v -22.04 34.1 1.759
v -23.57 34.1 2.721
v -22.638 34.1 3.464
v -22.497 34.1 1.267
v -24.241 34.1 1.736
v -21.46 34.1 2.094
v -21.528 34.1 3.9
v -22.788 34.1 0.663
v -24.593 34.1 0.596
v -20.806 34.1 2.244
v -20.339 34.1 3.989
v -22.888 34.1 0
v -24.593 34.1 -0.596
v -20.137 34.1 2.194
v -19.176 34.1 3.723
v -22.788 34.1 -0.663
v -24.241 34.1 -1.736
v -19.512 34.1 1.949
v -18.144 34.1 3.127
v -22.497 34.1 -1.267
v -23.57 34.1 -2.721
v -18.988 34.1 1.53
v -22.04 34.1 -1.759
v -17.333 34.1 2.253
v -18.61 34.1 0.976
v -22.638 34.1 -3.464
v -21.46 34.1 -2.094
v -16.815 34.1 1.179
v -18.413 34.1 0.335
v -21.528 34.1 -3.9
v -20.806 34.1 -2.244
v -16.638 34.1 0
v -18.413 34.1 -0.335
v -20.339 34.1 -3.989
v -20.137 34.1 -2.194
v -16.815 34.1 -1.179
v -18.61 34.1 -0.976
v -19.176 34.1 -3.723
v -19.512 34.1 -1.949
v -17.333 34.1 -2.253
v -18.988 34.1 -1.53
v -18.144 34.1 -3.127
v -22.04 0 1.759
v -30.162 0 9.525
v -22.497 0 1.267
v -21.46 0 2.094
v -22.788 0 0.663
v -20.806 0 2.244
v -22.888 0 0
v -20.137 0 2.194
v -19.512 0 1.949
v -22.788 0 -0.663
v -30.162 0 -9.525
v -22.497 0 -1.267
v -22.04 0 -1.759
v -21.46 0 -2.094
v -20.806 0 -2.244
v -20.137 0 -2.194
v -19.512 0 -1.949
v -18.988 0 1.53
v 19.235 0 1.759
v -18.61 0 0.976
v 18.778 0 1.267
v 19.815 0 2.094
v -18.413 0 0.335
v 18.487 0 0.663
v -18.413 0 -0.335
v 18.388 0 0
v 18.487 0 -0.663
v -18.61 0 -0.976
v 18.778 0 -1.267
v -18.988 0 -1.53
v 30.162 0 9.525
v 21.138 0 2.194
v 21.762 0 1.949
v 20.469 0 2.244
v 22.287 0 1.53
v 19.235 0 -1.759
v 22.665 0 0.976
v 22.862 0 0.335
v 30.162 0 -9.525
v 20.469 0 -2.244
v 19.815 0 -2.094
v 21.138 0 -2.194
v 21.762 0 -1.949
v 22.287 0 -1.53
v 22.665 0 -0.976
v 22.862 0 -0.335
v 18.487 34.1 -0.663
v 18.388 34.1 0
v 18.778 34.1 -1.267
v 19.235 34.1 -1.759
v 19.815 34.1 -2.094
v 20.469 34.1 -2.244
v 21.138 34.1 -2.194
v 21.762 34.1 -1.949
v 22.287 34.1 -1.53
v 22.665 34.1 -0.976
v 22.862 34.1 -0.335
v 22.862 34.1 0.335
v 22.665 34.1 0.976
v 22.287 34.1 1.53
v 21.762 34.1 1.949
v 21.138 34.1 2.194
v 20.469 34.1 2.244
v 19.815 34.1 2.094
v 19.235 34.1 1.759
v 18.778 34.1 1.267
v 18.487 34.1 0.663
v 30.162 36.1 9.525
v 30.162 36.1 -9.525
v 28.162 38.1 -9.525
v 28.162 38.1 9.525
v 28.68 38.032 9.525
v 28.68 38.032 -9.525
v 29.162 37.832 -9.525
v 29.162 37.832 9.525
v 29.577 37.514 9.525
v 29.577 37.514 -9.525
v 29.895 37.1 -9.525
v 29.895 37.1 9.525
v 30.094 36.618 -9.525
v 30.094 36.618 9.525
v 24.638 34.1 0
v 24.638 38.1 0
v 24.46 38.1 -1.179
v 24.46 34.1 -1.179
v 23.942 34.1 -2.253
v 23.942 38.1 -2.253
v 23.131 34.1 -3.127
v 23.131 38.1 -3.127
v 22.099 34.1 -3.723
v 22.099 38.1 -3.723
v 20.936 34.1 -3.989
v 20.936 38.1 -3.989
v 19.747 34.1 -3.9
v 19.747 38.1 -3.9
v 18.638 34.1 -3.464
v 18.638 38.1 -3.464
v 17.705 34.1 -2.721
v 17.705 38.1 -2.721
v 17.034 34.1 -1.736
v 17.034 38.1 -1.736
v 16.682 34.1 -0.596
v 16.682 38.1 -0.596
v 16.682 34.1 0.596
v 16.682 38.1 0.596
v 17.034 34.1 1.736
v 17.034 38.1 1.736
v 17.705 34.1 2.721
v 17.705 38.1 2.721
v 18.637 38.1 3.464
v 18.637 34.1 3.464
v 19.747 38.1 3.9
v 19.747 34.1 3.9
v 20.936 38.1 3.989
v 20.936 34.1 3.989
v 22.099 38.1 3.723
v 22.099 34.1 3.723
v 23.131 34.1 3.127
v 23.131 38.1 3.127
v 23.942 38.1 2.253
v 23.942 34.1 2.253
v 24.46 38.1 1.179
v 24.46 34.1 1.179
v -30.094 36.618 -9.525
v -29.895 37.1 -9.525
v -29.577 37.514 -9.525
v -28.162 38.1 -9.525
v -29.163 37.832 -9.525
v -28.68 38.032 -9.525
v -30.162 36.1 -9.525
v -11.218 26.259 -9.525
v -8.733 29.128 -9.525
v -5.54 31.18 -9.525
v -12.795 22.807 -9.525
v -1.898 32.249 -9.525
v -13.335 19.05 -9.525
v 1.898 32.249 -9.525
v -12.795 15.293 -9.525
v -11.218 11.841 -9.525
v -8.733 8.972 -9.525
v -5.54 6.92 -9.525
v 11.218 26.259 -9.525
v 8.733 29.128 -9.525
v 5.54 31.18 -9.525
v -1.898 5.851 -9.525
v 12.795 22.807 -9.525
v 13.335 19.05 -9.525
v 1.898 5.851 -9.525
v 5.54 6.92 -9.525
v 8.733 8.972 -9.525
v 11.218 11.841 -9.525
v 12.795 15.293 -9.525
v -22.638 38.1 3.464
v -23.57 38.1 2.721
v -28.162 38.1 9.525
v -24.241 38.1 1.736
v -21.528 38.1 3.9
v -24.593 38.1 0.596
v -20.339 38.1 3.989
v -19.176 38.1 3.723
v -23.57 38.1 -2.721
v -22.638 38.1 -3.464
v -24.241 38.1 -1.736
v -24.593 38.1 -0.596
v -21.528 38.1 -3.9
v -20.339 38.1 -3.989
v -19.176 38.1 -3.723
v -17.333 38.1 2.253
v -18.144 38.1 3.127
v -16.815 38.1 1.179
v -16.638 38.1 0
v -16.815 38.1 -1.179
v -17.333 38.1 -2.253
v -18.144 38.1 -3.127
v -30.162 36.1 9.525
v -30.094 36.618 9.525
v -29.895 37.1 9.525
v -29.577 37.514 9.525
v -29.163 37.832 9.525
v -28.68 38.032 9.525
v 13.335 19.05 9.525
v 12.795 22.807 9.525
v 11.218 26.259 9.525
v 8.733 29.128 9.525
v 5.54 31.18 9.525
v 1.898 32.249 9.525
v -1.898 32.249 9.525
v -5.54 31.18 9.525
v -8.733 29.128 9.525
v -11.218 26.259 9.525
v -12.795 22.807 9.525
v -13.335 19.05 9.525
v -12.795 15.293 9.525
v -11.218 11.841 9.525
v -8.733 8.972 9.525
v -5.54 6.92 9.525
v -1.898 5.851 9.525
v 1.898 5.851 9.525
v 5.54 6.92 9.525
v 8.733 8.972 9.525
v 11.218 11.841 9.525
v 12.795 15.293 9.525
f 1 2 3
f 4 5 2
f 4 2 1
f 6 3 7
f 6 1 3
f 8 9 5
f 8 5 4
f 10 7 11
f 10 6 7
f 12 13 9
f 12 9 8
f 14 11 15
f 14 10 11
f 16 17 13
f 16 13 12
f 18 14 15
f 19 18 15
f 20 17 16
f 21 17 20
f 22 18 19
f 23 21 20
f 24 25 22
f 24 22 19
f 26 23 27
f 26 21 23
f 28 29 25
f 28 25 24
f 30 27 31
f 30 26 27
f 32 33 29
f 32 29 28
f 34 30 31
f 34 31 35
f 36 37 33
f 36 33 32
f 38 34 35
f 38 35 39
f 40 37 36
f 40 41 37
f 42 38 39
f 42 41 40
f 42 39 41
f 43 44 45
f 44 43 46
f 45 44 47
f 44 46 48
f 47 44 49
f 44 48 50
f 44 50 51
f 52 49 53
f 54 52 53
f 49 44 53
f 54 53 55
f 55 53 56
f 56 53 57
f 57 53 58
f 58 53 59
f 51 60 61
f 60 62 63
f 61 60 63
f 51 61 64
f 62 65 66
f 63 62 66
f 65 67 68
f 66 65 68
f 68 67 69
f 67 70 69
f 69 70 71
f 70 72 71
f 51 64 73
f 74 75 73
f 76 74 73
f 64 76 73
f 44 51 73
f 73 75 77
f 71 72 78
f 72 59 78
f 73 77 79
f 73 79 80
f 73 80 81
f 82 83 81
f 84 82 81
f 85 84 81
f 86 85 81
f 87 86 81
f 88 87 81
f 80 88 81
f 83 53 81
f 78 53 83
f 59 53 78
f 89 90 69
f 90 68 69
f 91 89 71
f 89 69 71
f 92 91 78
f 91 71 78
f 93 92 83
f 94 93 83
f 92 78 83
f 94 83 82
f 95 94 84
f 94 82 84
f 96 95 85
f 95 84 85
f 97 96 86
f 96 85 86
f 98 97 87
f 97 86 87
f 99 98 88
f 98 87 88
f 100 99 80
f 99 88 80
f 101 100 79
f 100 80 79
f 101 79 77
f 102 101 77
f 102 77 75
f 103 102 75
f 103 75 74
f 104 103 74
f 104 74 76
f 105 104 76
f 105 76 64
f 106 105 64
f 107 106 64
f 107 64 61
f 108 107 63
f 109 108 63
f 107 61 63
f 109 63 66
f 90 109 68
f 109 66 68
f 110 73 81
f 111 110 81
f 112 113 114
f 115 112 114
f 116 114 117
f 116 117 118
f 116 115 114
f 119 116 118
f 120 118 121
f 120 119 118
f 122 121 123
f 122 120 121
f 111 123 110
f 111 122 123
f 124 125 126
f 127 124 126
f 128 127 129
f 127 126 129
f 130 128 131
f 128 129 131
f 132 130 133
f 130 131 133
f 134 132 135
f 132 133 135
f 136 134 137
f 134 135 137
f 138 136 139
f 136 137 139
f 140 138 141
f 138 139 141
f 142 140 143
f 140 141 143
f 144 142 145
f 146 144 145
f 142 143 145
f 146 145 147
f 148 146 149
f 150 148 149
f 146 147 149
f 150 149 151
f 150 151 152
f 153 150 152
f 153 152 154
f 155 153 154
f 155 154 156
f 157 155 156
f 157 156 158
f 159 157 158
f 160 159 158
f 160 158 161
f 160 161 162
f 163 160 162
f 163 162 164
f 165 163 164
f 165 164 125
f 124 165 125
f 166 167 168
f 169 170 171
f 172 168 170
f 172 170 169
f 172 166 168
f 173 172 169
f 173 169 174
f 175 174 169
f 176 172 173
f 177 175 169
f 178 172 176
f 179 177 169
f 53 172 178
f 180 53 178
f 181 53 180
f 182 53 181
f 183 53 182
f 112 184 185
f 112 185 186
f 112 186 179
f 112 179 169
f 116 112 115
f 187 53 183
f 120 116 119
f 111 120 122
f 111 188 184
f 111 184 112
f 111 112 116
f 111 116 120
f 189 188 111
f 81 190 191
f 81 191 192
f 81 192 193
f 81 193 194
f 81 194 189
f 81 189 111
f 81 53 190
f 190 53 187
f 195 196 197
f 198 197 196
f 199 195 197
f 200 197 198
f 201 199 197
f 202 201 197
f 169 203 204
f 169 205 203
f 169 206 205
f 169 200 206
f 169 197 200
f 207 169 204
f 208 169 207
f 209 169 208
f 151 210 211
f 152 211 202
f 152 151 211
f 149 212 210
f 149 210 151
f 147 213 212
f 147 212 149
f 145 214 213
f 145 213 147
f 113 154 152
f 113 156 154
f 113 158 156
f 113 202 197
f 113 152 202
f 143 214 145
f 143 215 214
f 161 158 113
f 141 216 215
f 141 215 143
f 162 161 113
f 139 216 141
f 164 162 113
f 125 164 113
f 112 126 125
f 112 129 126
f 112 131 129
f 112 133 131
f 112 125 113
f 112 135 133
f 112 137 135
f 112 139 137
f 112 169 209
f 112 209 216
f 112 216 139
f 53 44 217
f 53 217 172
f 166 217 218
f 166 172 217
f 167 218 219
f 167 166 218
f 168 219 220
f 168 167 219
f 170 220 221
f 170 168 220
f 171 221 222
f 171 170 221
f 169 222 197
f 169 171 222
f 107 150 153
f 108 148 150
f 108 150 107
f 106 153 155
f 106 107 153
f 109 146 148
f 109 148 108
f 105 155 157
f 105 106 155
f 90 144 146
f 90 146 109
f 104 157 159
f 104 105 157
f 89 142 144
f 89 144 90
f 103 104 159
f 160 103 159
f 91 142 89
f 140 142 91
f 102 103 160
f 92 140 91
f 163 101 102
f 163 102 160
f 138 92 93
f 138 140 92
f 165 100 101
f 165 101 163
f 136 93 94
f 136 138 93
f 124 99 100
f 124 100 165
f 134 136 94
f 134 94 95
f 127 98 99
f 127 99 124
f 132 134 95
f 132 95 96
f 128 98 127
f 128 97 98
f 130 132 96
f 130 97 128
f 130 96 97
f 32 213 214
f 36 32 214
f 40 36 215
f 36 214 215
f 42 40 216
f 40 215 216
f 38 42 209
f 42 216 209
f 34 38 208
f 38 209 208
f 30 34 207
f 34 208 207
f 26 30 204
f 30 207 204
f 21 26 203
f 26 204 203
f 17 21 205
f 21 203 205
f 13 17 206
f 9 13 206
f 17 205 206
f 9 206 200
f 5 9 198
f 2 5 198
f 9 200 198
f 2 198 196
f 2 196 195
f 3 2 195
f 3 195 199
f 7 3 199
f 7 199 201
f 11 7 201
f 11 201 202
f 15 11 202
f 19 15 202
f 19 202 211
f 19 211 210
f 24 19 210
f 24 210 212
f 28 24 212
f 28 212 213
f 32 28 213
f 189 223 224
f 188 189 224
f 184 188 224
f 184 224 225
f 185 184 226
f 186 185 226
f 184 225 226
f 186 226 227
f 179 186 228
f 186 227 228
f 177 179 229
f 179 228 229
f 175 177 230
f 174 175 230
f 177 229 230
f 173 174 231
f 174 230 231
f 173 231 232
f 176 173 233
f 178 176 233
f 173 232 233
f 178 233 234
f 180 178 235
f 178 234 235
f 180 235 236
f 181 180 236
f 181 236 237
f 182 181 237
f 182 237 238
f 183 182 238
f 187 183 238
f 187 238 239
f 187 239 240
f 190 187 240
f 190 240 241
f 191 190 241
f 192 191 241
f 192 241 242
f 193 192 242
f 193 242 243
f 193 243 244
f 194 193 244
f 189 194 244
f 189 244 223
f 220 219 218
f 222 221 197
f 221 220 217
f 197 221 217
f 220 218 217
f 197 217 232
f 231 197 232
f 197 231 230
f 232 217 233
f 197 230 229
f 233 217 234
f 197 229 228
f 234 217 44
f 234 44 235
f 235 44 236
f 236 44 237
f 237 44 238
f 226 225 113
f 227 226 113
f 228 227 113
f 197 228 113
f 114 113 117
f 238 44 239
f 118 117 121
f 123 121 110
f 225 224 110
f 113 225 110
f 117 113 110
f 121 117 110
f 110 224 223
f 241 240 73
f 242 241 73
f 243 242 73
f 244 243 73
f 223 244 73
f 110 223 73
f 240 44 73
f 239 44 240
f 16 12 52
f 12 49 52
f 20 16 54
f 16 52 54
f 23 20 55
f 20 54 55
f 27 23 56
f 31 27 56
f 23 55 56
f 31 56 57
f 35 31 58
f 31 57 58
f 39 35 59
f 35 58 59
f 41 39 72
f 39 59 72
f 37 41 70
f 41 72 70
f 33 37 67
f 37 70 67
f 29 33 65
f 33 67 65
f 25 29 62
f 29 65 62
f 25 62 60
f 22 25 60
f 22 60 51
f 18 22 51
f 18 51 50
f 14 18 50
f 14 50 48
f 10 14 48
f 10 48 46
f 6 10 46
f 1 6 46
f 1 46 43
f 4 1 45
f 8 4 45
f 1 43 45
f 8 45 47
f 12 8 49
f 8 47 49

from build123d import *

# Parameters (mm, degrees)
SKETCH1_W                      = 60.325
SKETCH1_H                      = 19.05
BOSS_EXTRUDE1_DEPTH            = 38.1
SKETCH2_R                      = 13.335
CUT_EXTRUDE1_DEPTH             = 20.05
CBORE_FOR_M4_SHCS1_D           = 4.5
CBORE_FOR_M4_SHCS1_CBORE_D     = 8
CBORE_FOR_M4_SHCS1_CBORE_DEPTH = 4
FILLET1_R                      = 2


with BuildPart() as part:
    # Sketch1 → Boss-Extrude1 (new body)
    with BuildSketch(Plane(origin=(0, 0, 0), x_dir=(1, 0, 0), z_dir=(0, 1, 0))):
        Rectangle(SKETCH1_W, SKETCH1_H)
    extrude(amount=BOSS_EXTRUDE1_DEPTH)

    # Sketch2 → Cut-Extrude1 (cut, through all)
    with BuildSketch(Plane.XY.offset(9.525)):
        with Locations((0, 19.05)):
            Circle(SKETCH2_R)
    extrude(amount=-CUT_EXTRUDE1_DEPTH, mode=Mode.SUBTRACT)

    # CBORE for M4 SHCS1 (through all)
    with Locations(Plane(origin=(0, 38.1, 0), x_dir=(1, 0, 0), z_dir=(0, 1, 0))):
        with Locations((-20.6375, 0), (20.6375, 0)):
            CounterBoreHole(CBORE_FOR_M4_SHCS1_D / 2, CBORE_FOR_M4_SHCS1_CBORE_D / 2, CBORE_FOR_M4_SHCS1_CBORE_DEPTH)

    # Fillet1
    fillet1_edges = [part.edges().sort_by_distance(p)[0] for p in [
        (-30.1625, 38.1, 0),
        (30.1625, 38.1, 0),
    ]]
    fillet(fillet1_edges, radius=FILLET1_R)


solid = part.part
